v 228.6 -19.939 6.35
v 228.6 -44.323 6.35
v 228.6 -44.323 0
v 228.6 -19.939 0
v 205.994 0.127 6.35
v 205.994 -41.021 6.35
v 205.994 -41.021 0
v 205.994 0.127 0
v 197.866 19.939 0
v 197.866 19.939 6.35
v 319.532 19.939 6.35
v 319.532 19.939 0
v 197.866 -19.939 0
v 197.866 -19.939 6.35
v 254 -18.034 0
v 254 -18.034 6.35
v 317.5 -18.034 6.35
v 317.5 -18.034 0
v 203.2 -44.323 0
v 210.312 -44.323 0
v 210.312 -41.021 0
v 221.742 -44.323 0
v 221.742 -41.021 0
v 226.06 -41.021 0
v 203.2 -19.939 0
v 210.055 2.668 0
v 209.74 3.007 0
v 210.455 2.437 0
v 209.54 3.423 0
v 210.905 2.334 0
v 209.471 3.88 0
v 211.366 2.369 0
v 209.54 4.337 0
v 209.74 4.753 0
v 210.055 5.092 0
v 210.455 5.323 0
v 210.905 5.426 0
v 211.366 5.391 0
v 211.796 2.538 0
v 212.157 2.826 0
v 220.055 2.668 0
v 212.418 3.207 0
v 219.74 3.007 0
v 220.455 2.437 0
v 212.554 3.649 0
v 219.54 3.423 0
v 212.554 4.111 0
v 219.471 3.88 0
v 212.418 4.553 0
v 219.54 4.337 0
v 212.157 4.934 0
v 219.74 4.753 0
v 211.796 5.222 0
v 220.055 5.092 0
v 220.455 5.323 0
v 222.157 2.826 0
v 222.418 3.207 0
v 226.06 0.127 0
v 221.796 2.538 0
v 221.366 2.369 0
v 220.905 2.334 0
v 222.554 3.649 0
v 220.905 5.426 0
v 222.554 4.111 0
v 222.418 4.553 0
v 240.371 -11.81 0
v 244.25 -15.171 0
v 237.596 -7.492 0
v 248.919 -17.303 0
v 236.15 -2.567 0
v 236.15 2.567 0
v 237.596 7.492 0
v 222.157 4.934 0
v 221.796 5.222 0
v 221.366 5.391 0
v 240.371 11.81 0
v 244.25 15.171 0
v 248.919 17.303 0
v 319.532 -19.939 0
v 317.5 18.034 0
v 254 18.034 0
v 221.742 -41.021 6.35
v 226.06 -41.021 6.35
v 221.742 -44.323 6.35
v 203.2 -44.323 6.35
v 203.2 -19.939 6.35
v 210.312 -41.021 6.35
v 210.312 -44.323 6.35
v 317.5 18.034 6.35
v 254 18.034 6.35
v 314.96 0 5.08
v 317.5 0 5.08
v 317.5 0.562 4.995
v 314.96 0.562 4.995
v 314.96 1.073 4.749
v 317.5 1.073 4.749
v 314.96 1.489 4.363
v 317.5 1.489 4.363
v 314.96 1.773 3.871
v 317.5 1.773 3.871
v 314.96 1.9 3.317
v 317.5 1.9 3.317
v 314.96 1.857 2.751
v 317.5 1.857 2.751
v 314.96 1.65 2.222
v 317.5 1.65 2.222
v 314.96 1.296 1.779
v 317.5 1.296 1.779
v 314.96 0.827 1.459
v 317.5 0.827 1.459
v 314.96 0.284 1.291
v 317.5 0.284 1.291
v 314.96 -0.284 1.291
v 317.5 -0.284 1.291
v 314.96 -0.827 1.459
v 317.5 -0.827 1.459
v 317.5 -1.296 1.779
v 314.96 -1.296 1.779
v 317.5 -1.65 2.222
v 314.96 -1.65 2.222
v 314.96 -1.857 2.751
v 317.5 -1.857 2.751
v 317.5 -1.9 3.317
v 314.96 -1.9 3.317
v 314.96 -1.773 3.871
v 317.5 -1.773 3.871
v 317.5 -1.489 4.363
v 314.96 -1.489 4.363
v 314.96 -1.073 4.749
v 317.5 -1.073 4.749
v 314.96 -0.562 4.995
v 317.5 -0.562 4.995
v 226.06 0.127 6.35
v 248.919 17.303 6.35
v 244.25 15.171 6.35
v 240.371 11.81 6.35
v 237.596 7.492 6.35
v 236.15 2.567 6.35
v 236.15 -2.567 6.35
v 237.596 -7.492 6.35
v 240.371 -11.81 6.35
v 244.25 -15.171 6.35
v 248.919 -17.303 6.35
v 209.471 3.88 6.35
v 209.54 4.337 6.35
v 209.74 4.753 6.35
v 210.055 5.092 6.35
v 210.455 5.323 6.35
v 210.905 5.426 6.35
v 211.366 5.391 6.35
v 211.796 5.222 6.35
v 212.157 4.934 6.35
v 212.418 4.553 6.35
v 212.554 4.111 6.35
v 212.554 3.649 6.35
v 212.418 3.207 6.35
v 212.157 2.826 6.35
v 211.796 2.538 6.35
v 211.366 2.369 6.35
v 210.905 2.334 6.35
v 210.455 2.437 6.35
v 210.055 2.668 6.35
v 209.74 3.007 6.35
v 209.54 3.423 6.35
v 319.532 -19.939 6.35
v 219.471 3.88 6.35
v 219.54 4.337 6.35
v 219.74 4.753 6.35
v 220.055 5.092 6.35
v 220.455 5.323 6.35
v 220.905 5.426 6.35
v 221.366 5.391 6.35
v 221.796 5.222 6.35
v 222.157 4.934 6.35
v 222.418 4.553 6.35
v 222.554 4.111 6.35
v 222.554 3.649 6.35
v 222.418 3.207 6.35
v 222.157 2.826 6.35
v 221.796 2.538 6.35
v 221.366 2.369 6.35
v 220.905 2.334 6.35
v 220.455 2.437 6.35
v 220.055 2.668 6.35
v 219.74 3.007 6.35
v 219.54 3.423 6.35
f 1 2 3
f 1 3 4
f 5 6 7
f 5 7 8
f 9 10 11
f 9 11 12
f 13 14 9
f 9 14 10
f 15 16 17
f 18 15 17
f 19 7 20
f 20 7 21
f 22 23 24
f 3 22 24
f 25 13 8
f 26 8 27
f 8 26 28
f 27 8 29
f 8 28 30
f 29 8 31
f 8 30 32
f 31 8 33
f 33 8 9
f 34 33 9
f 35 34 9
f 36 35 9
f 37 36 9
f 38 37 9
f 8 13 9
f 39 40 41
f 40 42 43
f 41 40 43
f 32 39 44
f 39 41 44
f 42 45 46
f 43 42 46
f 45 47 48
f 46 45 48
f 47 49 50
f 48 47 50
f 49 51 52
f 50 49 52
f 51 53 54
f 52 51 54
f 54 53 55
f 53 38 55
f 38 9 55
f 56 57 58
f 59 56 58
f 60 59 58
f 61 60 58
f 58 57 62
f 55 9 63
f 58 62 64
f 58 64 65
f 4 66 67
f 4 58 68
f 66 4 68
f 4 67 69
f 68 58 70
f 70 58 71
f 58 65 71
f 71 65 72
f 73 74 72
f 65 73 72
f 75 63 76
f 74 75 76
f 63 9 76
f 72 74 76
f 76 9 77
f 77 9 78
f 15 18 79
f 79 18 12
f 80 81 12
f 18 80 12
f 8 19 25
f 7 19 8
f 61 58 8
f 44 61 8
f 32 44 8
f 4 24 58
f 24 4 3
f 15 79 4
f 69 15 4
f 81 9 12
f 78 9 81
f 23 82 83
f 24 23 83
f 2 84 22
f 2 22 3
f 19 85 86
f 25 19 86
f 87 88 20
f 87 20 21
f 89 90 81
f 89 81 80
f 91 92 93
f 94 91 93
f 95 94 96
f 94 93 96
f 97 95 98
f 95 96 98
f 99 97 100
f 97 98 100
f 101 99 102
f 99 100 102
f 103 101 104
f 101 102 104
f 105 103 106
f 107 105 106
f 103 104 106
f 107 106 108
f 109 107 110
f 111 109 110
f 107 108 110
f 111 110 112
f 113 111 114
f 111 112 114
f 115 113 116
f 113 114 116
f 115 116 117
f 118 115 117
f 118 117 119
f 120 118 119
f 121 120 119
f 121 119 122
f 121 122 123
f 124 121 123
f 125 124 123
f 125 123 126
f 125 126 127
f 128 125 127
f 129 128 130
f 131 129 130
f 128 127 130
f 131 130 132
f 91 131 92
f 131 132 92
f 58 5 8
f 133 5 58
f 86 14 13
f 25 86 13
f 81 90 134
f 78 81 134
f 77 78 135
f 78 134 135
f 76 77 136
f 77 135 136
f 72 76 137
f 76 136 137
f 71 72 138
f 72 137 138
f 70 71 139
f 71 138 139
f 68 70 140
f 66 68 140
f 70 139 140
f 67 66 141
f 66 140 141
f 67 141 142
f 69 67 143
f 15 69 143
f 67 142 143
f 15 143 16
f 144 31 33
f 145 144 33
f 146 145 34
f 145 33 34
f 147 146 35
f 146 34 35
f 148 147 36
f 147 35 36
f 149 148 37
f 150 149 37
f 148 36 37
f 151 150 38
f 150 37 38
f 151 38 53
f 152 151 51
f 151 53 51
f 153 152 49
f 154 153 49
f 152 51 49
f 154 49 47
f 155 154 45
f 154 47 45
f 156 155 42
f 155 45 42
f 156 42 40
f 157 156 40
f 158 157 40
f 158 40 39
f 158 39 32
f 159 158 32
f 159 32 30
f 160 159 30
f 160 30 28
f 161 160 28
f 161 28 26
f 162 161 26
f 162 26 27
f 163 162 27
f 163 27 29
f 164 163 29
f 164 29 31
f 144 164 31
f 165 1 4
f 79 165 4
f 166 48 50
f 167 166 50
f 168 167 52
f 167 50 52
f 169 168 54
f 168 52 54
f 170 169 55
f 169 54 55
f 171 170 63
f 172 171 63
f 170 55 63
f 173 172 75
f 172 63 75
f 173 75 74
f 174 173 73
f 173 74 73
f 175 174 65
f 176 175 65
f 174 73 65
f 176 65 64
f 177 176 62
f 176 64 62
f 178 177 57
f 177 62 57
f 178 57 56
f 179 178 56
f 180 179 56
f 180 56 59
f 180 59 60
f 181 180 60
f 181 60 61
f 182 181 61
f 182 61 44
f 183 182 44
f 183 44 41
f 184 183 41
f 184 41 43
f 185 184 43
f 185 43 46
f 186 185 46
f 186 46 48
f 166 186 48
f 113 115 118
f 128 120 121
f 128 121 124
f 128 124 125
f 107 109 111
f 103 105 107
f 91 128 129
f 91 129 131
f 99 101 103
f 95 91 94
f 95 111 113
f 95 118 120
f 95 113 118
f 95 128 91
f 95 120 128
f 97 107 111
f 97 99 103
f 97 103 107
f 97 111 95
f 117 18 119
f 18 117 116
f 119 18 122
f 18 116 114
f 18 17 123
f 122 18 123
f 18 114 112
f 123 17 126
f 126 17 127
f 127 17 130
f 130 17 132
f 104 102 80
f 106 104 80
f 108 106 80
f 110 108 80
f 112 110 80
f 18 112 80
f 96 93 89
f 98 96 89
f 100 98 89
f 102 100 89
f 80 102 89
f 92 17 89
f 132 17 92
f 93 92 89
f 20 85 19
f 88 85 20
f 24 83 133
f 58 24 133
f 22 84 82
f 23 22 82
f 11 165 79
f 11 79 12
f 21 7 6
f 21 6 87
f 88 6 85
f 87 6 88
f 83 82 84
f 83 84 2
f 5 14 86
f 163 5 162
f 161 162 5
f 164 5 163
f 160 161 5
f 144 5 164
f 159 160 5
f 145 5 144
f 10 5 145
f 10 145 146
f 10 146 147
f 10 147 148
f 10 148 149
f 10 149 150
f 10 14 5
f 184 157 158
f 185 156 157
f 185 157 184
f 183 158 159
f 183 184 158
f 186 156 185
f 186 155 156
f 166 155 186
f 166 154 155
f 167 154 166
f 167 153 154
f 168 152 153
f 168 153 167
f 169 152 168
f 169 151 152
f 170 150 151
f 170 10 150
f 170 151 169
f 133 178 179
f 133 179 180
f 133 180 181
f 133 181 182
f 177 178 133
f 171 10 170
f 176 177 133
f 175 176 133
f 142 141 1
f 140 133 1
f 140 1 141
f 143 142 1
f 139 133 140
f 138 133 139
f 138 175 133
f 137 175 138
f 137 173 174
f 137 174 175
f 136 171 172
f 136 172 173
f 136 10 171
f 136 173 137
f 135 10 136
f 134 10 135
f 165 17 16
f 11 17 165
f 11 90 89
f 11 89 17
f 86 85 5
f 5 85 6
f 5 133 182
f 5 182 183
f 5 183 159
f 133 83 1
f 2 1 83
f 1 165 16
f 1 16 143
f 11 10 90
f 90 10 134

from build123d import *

# Parameters (mm, degrees)
SKETCH1_R                = 19.939
CIRCLE_EXTRUDE_DEPTH     = 6.35
SKETCH3_W                = 6.35
SKETCH3_H                = 39.878
RECTANGLE_EXTRUDE_DEPTH  = 127
SKETCH2_R                = 18.034
CIRCLE_CUT_DEPTH         = 129.712416732
SKETCH6_W                = 125.095
SKETCH6_H                = 36.068
RECTANGLE_CUT_DEPTH      = 129.712416732
SKETCH7_W                = 61.595
SKETCH7_H                = 36.068
END_SHAPE_DEPTH          = 6.35
SKETCH8_R                = 1.905
FOR_SPRING_EXTRUDE_DEPTH = 2.54
MIRRORED_PATTERN_COUNT   = 2
MIRRORED_PATTERN_PITCH   = 254
MIDDLE_CONNECTOR_REACH   = 256.861
SKETCH10_W               = 6.35
SKETCH10_H               = 39.878
SKETCH11_W               = 6.35
SKETCH11_H               = 39.878
END_CUT_DEPTH            = 55.88
SKETCH13_W               = 25.4
SKETCH13_H               = 44.45
BOSS_EXTRUDE1_DEPTH      = 6.35
SKETCH12_W               = 20.066
SKETCH12_H               = 41.148
CUT_EXTRUDE1_DEPTH       = 329.188764629
LPATTERN1_COUNT          = 2
LPATTERN1_PITCH          = 107.188
SKETCH14_R               = 1.55
CUT_EXTRUDE2_DEPTH       = 329.188764629
SKETCH16_W               = 11.43
SKETCH16_H               = 3.302
CUT_EXTRUDE4_DEPTH       = 329.188764629
SKETCH17_W               = 244.663086165
SKETCH17_H               = 85.398325617
SKETCH17_W_2             = 5.588
SKETCH17_H_2             = 39.878
CUT_EXTRUDE5_DEPTH       = 329.188764629


with BuildPart() as part:
    # Sketch1 → circle extrude (new body)
    with BuildSketch(Plane.XY):
        Circle(SKETCH1_R)
    extrude(amount=CIRCLE_EXTRUDE_DEPTH)

    # Sketch3 → rectangle extrude (add)
    with BuildSketch(Plane(origin=(0, 0, 0), x_dir=(0, 0, -1), z_dir=(1, 0, 0))):
        with Locations((-3.175, 0)):
            Rectangle(SKETCH3_W, SKETCH3_H)
    extrude(amount=RECTANGLE_EXTRUDE_DEPTH)

    # Sketch2 → circle cut (cut, through all)
    with BuildSketch(Plane.XY.offset(6.35)):
        Circle(SKETCH2_R)
    extrude(amount=-CIRCLE_CUT_DEPTH, mode=Mode.SUBTRACT)

    # Sketch6 → rectangle cut (cut, through all)
    with BuildSketch(Plane.XY.offset(6.35)):
        with Locations((62.5475, 0)):
            Rectangle(SKETCH6_W, SKETCH6_H)
    extrude(amount=-RECTANGLE_CUT_DEPTH, mode=Mode.SUBTRACT)

    # Sketch7 → end shape (add)
    with BuildSketch(Plane.XY.offset(6.35)):
        with Locations((94.2975, 0)):
            Rectangle(SKETCH7_W, SKETCH7_H)
    extrude(amount=-END_SHAPE_DEPTH)

    # Sketch8 → for spring extrude (add)
    with BuildSketch(Plane.ZY.offset(-63.5)):
        with Locations((3.175, 0)):
            Circle(SKETCH8_R)
    extrude(amount=FOR_SPRING_EXTRUDE_DEPTH)


with BuildPart() as mirrored_pattern_1:
    # mirrored pattern: pattern copy
    add(part.part.moved(Location(Vector(1, 0, 0) * (1 * MIRRORED_PATTERN_PITCH))))

    # Sketch10 → middle connector (add, up to next)
    with BuildSketch(Plane(origin=(127, 0, 0), x_dir=(0, 0, -1), z_dir=(1, 0, 0)), mode=Mode.PRIVATE) as middle_connector_sk1:
        with Locations((-3.175, 0)):
            Rectangle(SKETCH10_W, SKETCH10_H)
    middle_connector_tool1 = extrude(middle_connector_sk1.sketch, amount=MIDDLE_CONNECTOR_REACH, mode=Mode.PRIVATE) - mirrored_pattern_1.part

    add(part.part)  # middle connector merges part
    add(middle_connector_tool1.solids().sort_by_distance((127, 0, 3.175))[0])

    # Sketch11 → end cut (cut)
    with BuildSketch(Plane(origin=(381, 0, 0), x_dir=(0, 0, -1), z_dir=(1, 0, 0))):
        with Locations((-3.175, 0)):
            Rectangle(SKETCH11_W, SKETCH11_H)
    extrude(amount=-END_CUT_DEPTH, mode=Mode.SUBTRACT)

    # Sketch13 → Boss-Extrude1 (add)
    with BuildSketch(Plane.XY.offset(6.35)):
        with Locations((215.9, -22.098)):
            Rectangle(SKETCH13_W, SKETCH13_H)
    boss_extrude1 = extrude(amount=-BOSS_EXTRUDE1_DEPTH)

    # Sketch12 → Cut-Extrude1 (cut, through all)
    with BuildSketch(Plane.XY.offset(6.35)):
        with Locations((216.027, -20.447)):
            Rectangle(SKETCH12_W, SKETCH12_H)
    cut_extrude1 = extrude(amount=-CUT_EXTRUDE1_DEPTH, mode=Mode.SUBTRACT)

    # LPattern1: Boss-Extrude1, Cut-Extrude1 ×2
    with Locations(*[(-i * LPATTERN1_PITCH, 0, 0) for i in range(1, LPATTERN1_COUNT)]):
        add(boss_extrude1)
        add(cut_extrude1, mode=Mode.SUBTRACT)

    # Sketch14 → Cut-Extrude2 (cut, through all)
    with BuildSketch(Plane(origin=(0, 0, 0), x_dir=(-1, 0, 0), z_dir=(0, 0, -1))):
        with Locations((-103.96, 3.88)):
            Circle(SKETCH14_R)
        with Locations((-113.96, 3.88)):
            Circle(SKETCH14_R)
        with Locations((-211.021, 3.88)):
            Circle(SKETCH14_R)
        with Locations((-221.021, 3.88)):
            Circle(SKETCH14_R)
    extrude(amount=-CUT_EXTRUDE2_DEPTH, mode=Mode.SUBTRACT)

    # Sketch16 → Cut-Extrude4 (cut, through all)
    with BuildSketch(Plane.XY.offset(6.35)):
        with Locations((216.027, -42.672)):
            Rectangle(SKETCH16_W, SKETCH16_H)
    extrude(amount=-CUT_EXTRUDE4_DEPTH, mode=Mode.SUBTRACT)

    # Sketch17 → Cut-Extrude5 (cut, through all)
    with BuildSketch(Plane.XY.offset(6.35)):
        with Locations((75.534456918, -9.69861823)):
            Rectangle(SKETCH17_W, SKETCH17_H)
        with Locations((322.326, 0)):
            Rectangle(SKETCH17_W_2, SKETCH17_H_2)
    extrude(amount=-CUT_EXTRUDE5_DEPTH, mode=Mode.SUBTRACT)


solid = mirrored_pattern_1.part
